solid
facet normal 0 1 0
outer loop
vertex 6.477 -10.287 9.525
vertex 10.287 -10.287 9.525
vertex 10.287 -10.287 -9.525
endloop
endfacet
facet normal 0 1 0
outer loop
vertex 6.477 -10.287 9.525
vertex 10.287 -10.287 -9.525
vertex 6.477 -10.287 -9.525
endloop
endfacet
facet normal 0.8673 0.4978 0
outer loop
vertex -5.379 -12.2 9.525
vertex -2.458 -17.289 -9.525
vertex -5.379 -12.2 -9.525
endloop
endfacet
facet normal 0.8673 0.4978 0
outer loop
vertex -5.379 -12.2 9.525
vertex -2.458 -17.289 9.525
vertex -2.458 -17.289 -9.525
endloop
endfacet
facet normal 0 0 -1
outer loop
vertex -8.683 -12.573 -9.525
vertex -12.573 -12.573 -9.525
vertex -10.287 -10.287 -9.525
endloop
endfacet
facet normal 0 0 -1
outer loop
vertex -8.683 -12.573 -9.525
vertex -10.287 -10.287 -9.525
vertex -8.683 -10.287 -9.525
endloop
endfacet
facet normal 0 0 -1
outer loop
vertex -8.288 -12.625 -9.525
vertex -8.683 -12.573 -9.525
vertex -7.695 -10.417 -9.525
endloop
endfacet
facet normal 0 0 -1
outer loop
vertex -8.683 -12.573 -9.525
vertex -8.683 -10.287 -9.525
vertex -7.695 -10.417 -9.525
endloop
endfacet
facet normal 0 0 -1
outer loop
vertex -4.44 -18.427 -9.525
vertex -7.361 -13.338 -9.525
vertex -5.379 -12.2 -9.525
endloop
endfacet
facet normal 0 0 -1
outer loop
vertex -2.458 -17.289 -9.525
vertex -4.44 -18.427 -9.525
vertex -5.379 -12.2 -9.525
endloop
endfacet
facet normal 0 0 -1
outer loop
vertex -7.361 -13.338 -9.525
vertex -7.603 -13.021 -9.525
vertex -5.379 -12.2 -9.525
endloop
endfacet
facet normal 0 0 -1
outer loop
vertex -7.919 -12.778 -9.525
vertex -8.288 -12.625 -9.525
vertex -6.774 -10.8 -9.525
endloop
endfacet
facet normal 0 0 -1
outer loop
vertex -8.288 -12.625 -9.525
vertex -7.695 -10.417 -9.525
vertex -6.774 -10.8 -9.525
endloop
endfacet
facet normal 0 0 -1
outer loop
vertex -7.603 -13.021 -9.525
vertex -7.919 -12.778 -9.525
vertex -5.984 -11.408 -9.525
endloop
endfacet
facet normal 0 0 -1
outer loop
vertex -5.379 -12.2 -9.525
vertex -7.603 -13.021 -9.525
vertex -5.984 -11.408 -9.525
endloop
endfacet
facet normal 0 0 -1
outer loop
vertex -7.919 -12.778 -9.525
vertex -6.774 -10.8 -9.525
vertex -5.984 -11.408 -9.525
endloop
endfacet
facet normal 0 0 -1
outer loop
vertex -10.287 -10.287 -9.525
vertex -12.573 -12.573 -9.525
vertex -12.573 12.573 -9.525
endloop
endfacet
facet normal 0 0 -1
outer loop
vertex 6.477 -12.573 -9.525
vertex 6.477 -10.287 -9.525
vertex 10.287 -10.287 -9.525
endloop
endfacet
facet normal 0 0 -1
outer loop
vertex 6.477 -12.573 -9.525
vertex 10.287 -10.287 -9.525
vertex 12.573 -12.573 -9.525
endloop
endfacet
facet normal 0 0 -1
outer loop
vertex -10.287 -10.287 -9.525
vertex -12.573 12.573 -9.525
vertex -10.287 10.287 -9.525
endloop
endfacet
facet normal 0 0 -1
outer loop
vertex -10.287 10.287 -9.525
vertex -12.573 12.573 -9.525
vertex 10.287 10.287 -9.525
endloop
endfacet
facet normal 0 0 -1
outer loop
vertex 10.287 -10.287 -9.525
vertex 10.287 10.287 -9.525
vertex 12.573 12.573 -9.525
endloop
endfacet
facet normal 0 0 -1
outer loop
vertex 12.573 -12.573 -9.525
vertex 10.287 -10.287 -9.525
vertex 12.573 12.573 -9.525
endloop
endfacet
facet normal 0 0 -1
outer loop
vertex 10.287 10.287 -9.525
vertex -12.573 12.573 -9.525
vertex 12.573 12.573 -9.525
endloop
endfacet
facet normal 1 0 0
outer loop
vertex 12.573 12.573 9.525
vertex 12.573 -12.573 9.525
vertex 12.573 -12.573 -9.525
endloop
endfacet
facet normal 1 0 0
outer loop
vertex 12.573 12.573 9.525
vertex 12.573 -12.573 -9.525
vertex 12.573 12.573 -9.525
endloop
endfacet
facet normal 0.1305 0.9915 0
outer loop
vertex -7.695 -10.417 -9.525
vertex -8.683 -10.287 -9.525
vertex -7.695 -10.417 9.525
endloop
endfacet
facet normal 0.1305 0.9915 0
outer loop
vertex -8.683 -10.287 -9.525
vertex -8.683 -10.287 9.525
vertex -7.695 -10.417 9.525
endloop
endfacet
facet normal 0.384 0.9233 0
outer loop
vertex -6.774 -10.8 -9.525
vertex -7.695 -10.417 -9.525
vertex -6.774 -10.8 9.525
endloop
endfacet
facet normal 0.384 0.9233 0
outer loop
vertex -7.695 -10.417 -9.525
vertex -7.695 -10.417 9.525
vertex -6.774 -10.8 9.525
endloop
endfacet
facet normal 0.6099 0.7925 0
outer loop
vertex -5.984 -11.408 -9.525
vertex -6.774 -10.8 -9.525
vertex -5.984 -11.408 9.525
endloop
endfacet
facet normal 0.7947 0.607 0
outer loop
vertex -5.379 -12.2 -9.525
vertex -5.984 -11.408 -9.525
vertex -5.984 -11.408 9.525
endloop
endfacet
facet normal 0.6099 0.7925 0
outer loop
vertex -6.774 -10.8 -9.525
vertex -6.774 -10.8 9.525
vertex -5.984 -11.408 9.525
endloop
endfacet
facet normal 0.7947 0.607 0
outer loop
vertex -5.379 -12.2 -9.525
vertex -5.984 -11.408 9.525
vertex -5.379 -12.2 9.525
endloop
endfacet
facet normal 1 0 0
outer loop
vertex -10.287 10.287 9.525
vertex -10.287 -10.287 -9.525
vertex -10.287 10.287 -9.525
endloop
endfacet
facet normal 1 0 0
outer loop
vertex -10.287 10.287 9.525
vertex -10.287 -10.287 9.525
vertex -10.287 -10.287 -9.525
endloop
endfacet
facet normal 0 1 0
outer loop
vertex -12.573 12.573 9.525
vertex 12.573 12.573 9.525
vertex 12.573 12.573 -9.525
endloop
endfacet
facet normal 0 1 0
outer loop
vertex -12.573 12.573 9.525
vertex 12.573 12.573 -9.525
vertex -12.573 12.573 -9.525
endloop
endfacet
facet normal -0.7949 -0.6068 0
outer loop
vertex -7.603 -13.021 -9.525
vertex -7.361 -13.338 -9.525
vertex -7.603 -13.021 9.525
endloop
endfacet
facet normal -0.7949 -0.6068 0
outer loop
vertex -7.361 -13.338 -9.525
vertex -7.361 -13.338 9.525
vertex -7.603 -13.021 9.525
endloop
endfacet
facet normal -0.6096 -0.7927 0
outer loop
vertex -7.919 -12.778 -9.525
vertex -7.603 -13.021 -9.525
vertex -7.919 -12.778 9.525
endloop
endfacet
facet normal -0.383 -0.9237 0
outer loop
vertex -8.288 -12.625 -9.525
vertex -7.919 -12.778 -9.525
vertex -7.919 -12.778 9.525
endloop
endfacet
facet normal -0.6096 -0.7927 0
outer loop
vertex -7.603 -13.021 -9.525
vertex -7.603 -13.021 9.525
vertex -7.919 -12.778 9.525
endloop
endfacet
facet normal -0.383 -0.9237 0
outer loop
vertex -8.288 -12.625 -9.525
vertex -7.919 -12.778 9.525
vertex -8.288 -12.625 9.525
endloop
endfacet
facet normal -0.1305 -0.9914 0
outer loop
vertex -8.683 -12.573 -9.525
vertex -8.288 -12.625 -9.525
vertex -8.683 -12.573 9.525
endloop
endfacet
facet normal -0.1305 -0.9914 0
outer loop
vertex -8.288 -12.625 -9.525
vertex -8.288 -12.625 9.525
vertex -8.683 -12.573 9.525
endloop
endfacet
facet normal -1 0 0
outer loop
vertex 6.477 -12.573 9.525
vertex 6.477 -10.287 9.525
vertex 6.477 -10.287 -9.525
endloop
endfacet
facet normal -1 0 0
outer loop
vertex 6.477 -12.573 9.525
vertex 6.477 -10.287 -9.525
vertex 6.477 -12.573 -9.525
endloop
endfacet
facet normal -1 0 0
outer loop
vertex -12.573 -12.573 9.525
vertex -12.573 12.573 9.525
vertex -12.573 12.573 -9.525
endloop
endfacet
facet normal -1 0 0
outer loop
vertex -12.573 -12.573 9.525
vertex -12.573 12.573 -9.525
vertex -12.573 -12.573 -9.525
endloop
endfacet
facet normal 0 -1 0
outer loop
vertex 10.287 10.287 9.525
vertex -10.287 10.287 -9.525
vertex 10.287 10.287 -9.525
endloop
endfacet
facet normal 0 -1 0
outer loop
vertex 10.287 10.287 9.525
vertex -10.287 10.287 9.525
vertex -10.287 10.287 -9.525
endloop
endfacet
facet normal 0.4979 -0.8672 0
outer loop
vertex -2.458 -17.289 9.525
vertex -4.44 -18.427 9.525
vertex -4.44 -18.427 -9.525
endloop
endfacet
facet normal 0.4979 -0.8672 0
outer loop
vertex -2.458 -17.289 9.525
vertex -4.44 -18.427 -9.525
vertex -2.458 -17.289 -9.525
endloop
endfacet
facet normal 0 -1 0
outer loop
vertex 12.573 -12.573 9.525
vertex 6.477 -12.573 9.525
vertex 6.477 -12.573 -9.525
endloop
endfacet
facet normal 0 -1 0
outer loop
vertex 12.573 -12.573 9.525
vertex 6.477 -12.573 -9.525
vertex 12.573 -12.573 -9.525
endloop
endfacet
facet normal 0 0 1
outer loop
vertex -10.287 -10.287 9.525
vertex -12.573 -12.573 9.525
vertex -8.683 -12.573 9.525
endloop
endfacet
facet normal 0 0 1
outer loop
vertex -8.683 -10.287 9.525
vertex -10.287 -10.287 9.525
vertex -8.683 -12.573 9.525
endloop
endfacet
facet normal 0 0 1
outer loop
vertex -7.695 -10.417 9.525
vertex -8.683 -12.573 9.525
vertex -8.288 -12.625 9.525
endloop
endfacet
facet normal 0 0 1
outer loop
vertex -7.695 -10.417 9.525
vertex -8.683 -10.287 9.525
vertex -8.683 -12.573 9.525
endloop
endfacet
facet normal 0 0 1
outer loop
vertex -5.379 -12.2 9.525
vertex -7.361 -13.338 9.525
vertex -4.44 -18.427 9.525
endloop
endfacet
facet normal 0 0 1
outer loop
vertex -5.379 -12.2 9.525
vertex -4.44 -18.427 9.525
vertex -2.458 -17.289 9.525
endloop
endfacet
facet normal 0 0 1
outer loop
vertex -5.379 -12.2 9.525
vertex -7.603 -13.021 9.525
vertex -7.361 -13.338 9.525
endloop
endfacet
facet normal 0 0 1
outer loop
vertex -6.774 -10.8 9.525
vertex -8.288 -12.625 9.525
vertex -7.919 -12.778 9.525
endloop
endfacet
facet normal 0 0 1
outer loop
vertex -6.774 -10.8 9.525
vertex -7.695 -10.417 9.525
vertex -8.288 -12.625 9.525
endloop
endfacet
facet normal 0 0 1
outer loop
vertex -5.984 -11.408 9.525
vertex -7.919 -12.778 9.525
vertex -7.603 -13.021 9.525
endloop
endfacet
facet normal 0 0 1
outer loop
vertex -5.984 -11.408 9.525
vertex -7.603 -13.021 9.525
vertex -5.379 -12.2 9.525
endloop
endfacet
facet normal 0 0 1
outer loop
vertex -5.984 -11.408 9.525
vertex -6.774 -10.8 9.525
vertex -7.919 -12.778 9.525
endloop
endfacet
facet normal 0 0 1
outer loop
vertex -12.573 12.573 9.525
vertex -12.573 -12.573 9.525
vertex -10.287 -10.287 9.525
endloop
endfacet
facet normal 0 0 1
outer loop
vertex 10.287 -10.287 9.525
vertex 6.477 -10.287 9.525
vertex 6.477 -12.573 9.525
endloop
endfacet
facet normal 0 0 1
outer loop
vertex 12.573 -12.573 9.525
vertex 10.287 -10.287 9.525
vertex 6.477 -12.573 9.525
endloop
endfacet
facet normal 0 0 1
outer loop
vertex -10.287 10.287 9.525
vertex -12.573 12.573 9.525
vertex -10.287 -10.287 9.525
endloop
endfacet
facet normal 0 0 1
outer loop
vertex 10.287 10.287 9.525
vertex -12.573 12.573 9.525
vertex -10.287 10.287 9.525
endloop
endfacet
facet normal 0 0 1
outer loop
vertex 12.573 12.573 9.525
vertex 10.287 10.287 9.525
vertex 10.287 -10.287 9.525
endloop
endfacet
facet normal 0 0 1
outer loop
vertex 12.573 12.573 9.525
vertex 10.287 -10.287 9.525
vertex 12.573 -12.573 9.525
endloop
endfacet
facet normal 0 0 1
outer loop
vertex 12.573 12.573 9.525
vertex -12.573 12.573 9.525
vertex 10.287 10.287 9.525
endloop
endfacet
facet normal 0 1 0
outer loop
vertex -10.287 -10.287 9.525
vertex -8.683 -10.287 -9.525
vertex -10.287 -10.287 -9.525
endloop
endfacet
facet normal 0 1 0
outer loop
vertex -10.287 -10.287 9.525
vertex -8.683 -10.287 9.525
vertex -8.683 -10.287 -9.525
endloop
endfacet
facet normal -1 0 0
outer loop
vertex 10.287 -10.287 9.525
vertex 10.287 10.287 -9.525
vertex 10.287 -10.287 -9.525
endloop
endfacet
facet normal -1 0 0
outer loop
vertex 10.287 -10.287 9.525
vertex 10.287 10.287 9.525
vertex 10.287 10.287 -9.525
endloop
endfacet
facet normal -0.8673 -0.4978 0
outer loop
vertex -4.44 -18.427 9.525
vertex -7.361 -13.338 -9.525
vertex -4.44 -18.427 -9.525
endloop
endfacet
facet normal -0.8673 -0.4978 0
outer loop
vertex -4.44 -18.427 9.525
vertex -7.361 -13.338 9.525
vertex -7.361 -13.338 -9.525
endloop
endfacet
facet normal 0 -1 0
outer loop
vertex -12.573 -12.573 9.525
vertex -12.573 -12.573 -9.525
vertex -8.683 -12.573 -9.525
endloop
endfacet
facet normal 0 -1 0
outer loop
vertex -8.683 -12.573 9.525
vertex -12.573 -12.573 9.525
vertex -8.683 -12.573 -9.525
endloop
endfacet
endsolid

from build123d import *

# Parameters (mm, degrees)
F2_DEPTH = 9.525
F3_R     = 3.81
F4_R     = 1.524


with BuildPart() as f2:
    # F1 (on Top) → F2 (new body, symmetric)
    with BuildSketch(Plane.XY):
        Polygon((10.287, 10.287), (10.287, -10.287), (6.477, -10.287), (6.477, -12.573), (12.573, -12.573), (12.573, 12.573), (-12.573, 12.573), (-12.573, -12.573), (-7.800612, -12.573), (-4.440114, -18.427097), (-2.457546, -17.28902), (-6.477, -10.287), (-10.287, -10.287), (-10.287, 10.287), align=None)
    extrude(amount=F2_DEPTH, both=True)

    # F3
    f3_edges = [f2.edges().sort_by_distance(p)[0] for p in [
        (-6.477, -10.287, 0),
    ]]
    fillet(f3_edges, radius=F3_R)

    # F4
    f4_edges = [f2.edges().sort_by_distance(p)[0] for p in [
        (-7.800612, -12.573, 0),
    ]]
    fillet(f4_edges, radius=F4_R)


solid = f2.part
